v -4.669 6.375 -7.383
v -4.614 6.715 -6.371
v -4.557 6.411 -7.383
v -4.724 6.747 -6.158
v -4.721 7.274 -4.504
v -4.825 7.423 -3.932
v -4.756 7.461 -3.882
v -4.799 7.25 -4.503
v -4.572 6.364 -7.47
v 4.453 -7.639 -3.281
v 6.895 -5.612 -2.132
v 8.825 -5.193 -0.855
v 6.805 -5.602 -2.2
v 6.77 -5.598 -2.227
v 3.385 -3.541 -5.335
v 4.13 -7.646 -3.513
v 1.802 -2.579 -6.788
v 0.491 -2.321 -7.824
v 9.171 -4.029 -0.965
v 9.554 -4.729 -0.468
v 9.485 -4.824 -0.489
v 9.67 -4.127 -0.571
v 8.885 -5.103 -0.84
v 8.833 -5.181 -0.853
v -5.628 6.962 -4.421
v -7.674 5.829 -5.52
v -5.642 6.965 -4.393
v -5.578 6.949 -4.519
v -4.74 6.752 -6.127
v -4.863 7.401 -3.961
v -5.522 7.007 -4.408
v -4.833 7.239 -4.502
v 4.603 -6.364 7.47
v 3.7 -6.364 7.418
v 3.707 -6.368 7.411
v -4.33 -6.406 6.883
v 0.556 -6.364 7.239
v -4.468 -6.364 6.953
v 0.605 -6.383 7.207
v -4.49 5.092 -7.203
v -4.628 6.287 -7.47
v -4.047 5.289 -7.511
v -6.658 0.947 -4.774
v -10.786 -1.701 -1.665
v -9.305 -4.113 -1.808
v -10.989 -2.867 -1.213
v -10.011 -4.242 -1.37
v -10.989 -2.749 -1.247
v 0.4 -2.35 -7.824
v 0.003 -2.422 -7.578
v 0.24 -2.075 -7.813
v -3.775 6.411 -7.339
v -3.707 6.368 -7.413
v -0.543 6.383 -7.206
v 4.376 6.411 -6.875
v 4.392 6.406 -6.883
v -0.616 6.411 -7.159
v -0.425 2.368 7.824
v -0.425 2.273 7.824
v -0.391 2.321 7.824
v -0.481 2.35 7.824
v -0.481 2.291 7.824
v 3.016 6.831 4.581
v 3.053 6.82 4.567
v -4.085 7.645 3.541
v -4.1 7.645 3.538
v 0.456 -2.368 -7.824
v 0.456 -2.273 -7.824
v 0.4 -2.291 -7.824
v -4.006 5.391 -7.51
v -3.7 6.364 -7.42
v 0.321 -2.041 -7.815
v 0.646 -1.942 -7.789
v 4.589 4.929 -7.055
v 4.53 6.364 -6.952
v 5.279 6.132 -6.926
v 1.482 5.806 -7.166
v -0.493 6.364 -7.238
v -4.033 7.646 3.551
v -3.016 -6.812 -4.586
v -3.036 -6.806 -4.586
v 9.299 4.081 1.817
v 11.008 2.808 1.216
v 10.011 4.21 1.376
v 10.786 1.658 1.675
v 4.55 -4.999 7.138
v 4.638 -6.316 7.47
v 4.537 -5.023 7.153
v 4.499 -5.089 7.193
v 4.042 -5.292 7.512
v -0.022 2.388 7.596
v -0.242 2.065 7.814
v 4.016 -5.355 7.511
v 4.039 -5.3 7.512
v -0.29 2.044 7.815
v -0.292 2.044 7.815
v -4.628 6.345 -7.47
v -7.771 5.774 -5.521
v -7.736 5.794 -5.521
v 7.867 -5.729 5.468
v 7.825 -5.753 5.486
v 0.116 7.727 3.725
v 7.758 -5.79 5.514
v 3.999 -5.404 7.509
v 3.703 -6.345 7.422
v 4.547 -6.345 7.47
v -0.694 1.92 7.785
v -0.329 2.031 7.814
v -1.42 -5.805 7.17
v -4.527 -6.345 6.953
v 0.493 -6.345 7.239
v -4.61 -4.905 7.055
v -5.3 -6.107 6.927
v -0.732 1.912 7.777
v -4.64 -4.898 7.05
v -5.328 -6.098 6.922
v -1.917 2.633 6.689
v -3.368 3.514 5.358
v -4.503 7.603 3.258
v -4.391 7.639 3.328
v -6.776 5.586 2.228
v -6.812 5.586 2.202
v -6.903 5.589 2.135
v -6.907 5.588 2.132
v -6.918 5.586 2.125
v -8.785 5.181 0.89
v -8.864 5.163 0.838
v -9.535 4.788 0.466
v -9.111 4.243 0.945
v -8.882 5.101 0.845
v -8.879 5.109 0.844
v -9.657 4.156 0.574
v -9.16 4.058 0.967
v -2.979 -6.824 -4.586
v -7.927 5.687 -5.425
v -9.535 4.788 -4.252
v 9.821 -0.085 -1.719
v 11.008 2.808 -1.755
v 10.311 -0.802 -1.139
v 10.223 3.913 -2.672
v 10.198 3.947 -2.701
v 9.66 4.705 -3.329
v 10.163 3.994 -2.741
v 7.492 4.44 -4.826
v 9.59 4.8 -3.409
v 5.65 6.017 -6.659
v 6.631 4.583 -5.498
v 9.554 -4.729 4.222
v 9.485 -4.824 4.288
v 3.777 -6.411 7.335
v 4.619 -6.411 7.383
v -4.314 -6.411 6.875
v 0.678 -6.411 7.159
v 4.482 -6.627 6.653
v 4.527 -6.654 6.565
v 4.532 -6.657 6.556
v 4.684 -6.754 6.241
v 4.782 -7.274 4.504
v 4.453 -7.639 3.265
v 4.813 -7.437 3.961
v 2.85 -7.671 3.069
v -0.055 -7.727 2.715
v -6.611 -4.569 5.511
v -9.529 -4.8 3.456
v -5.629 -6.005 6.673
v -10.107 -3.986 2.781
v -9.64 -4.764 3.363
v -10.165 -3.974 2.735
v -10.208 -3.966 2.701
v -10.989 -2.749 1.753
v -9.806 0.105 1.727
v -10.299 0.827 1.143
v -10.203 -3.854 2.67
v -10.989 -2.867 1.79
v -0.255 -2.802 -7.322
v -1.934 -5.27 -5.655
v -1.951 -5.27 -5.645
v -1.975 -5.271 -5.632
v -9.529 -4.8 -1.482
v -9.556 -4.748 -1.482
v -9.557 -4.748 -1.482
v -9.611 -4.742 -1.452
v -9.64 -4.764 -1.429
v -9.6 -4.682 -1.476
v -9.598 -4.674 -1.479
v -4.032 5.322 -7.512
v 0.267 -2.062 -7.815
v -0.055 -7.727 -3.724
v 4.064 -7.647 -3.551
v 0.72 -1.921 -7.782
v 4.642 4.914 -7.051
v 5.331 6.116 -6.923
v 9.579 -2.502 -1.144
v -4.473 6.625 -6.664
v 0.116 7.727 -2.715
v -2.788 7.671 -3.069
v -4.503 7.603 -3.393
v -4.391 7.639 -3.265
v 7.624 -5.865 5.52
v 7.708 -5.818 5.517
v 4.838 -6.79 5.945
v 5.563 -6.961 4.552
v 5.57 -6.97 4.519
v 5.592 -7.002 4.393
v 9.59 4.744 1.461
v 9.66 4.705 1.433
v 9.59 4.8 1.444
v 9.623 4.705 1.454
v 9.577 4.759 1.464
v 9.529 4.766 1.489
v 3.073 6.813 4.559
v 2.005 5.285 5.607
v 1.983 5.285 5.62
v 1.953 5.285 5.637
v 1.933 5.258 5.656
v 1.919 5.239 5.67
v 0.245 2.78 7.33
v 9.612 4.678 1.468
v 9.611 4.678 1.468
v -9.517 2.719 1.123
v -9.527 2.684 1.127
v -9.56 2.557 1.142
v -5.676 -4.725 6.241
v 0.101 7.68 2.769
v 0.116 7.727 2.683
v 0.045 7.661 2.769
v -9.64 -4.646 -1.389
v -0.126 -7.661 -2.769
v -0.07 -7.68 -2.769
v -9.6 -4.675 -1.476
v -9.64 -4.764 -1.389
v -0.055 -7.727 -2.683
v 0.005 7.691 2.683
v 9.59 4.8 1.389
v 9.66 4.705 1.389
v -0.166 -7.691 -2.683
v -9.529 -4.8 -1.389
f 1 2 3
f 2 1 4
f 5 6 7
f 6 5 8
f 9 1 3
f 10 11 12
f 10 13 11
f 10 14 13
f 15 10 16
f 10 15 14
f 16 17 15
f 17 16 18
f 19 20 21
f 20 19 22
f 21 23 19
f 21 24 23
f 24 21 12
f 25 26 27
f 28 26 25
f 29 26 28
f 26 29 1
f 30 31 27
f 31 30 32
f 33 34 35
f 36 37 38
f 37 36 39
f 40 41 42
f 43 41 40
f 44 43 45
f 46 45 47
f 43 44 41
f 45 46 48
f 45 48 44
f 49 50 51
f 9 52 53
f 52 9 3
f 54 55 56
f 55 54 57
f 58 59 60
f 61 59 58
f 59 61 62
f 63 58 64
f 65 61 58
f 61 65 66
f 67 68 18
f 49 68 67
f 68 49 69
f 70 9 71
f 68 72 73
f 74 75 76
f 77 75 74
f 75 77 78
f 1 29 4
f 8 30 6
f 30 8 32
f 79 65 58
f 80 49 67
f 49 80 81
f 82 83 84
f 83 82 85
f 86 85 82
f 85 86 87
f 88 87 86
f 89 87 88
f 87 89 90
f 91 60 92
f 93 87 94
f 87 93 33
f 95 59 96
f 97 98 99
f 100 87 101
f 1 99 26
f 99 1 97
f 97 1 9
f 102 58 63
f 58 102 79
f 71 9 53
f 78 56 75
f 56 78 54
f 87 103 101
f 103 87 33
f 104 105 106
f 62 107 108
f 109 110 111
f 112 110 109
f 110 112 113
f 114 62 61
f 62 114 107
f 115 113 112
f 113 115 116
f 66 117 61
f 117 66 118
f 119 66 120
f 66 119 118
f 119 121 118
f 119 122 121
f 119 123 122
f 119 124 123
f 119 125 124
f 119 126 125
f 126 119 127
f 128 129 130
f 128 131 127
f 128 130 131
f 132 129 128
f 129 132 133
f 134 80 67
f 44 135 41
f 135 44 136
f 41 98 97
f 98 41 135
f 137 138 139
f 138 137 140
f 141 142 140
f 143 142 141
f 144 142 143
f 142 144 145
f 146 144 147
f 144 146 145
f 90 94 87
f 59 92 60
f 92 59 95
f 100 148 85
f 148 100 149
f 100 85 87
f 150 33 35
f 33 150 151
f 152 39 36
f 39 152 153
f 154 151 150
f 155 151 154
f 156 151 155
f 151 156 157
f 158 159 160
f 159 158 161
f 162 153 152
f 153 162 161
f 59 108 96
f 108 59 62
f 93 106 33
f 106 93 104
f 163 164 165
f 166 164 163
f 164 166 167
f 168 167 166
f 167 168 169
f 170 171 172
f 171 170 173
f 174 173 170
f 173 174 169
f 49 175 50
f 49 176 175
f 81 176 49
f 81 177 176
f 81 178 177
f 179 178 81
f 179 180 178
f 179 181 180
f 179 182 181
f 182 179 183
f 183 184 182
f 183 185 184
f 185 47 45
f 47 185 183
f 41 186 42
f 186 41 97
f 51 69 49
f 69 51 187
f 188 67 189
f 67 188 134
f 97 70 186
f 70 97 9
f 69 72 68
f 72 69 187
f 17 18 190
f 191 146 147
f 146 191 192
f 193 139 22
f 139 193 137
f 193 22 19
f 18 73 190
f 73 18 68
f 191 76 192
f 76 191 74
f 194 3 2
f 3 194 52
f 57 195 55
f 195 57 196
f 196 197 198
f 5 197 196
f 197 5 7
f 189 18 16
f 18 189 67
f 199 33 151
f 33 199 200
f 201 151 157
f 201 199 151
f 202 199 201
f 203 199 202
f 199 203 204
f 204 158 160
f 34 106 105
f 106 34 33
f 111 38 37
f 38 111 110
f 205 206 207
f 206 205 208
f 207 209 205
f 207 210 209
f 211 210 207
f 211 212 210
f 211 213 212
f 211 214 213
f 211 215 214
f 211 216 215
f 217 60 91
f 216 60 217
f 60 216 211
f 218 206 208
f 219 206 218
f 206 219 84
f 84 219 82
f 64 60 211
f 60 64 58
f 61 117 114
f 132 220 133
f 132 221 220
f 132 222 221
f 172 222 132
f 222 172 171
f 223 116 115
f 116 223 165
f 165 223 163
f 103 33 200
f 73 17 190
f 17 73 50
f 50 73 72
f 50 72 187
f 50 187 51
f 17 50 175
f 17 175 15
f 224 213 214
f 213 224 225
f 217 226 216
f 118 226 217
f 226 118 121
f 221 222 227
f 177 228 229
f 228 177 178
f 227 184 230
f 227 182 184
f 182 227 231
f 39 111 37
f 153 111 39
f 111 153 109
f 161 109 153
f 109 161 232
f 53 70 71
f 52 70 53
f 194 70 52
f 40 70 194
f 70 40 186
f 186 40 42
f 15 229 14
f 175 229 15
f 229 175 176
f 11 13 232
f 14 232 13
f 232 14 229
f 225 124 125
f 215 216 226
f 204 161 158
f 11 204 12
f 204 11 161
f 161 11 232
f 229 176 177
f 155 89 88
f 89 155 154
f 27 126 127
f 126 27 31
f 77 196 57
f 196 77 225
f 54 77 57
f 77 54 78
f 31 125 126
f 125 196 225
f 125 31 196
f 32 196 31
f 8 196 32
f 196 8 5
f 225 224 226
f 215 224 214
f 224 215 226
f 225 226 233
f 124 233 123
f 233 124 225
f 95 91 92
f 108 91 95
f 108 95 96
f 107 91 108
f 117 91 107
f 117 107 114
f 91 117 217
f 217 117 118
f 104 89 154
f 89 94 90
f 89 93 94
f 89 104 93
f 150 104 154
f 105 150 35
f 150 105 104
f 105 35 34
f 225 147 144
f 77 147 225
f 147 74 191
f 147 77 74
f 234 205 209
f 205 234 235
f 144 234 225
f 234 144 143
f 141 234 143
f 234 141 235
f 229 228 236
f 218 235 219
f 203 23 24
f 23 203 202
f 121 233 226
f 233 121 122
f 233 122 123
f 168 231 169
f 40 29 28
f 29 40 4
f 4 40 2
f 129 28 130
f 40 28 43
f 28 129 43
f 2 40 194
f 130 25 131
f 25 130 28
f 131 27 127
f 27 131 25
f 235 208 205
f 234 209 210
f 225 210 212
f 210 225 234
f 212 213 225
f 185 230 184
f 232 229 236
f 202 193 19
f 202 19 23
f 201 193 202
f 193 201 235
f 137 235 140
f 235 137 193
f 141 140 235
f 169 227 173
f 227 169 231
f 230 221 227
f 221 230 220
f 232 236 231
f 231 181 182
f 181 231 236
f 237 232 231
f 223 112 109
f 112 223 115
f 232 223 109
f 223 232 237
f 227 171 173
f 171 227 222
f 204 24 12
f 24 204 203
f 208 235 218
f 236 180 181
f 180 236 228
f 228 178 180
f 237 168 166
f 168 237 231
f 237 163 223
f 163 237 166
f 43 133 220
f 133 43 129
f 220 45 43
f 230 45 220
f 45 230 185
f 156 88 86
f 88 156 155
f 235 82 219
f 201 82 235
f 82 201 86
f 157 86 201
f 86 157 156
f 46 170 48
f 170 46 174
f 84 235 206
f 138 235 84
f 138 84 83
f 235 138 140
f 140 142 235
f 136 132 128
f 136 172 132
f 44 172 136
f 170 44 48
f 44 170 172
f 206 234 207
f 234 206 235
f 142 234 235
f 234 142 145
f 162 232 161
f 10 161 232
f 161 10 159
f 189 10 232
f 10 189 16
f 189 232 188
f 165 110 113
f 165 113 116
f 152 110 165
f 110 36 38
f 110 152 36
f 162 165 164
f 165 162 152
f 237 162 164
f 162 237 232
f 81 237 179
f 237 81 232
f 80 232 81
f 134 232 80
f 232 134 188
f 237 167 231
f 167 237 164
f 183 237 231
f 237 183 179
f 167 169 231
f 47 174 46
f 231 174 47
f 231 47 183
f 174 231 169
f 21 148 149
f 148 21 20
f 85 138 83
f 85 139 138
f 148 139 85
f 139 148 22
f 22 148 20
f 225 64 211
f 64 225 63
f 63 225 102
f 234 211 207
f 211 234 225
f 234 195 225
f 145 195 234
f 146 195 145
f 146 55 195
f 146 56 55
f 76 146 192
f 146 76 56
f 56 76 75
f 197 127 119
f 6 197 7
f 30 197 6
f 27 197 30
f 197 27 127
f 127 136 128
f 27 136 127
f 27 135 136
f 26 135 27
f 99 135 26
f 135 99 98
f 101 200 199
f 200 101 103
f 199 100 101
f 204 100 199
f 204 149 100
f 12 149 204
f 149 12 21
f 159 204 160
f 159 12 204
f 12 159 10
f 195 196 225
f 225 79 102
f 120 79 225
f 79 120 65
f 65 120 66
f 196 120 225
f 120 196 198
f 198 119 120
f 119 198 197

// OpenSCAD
// Auto-generated OpenSCAD file

    inner_points = 10*[[0.9453936894816409, -0.47289547434939777, -0.19263732612249004], [0.9559597690770948, 0.47047255319654285, 0.13894241174769978], [-0.4527324971708146, -0.18894257072883713, -0.9559510908824418], [-0.44216641757536057, 0.7544254568171036, -0.624371353012252], [0.44216641757536057, -0.7544254568171036, 0.624371353012252], [0.4527324971708146, 0.18894257072883713, 0.9559510908824418], [-0.9559597690770948, -0.47047255319654285, -0.13894241174769978], [-0.9453936894816409, 0.47289547434939777, 0.19263732612249004], [1.0907778029145119, 0.2807812586554431, -0.8336013201880601], [0.22668829900201493, 0.4562738042971726, -1.305355170890352], [-0.22668829900201493, -0.4562738042971726, 1.305355170890352], [-1.0907778029145119, -0.2807812586554431, 0.8336013201880601], [-0.008548137956640611, -0.7632007662346396, -0.2682536429273739], [0.008548137956640611, 0.7632007662346396, 0.2682536429273739]];

    outer_points = 10*[[0.513230909726221, -0.9184428339478712, -0.2180946841600515], [0.4587614600394385, -0.6315952925971899, 0.738331772537947], [0.5396207656457714, 0.6315952925971899, -0.6814728995641832], [0.485151315958989, 0.9184428339478712, 0.27495355713381525], [-0.485151315958989, -0.9184428339478712, -0.27495355713381525], [-0.5396207656457714, -0.6315952925971899, 0.6814728995641832], [-0.4587614600394385, 0.6315952925971899, -0.738331772537947], [-0.513230909726221, 0.9184428339478712, 0.2180946841600515], [1.2987443863455765, -0.47898812303152916, 0.21762097438667488], [1.3150542142620716, 0.47898812303152916, -0.06876251237934862], [-1.3150542142620716, -0.47898812303152916, 0.06876251237934862], [-1.2987443863455765, 0.47898812303152916, -0.21762097438667488], [0.04406671047085817, -0.23206453574737165, -0.7737652573384957], [-0.04406671047085817, 0.23206453574737165, 0.7737652573384957]];

    // Convex hull for inner set (I)
    module inner_hull() {
        hull() {
            for (p = inner_points) {
                translate(p) sphere(r=0.1);
            }
        }
    }

    // Convex hull for outer set (O) minus inner hull (O \ I)
    module outer_minus_inner() {
        difference() {
            hull() {
                for (p = outer_points) {
                    translate(p) sphere(r=0.1);
                }
            }
            inner_hull(); // Subtract inner hull
        }
    }

    // Convex hull for outer set (O) minus all translated inner hulls
    module outer_minus_AllTranslationInner() {
        difference() {
            hull() {
                for (p = outer_points) {
                    translate(p) sphere(r=0.1);
                }
            }
            hull() {
                translate([0,0,50]) inner_hull();
                translate([0,0,-50]) inner_hull();
            }; // Subtract translated inner hulls
        }
    }

    // Difference between outer_minus_inner and outer_minus_AllTranslationInner
    module outer_minus_inner_diff() {
        difference() {
            // Outer minus inner
            difference() {
                hull() {
                    for (p = outer_points) {
                        translate(p) sphere(r=0.1);
                    }
                }
                inner_hull();
            }

            // Subtract Outer minus AllTranslationInner
            difference() {
                hull() {
                    for (p = outer_points) {
                        translate(p) sphere(r=0.1);
                    }
                }
                hull() {
                    translate([0,0,50]) inner_hull();
                    translate([0,0,-50]) inner_hull();
                };
            }
        }
    }

    // Rendering all with colors applied
    color([1, 1, 0, 1]) outer_minus_inner_diff(); // Opaque yellow
    
